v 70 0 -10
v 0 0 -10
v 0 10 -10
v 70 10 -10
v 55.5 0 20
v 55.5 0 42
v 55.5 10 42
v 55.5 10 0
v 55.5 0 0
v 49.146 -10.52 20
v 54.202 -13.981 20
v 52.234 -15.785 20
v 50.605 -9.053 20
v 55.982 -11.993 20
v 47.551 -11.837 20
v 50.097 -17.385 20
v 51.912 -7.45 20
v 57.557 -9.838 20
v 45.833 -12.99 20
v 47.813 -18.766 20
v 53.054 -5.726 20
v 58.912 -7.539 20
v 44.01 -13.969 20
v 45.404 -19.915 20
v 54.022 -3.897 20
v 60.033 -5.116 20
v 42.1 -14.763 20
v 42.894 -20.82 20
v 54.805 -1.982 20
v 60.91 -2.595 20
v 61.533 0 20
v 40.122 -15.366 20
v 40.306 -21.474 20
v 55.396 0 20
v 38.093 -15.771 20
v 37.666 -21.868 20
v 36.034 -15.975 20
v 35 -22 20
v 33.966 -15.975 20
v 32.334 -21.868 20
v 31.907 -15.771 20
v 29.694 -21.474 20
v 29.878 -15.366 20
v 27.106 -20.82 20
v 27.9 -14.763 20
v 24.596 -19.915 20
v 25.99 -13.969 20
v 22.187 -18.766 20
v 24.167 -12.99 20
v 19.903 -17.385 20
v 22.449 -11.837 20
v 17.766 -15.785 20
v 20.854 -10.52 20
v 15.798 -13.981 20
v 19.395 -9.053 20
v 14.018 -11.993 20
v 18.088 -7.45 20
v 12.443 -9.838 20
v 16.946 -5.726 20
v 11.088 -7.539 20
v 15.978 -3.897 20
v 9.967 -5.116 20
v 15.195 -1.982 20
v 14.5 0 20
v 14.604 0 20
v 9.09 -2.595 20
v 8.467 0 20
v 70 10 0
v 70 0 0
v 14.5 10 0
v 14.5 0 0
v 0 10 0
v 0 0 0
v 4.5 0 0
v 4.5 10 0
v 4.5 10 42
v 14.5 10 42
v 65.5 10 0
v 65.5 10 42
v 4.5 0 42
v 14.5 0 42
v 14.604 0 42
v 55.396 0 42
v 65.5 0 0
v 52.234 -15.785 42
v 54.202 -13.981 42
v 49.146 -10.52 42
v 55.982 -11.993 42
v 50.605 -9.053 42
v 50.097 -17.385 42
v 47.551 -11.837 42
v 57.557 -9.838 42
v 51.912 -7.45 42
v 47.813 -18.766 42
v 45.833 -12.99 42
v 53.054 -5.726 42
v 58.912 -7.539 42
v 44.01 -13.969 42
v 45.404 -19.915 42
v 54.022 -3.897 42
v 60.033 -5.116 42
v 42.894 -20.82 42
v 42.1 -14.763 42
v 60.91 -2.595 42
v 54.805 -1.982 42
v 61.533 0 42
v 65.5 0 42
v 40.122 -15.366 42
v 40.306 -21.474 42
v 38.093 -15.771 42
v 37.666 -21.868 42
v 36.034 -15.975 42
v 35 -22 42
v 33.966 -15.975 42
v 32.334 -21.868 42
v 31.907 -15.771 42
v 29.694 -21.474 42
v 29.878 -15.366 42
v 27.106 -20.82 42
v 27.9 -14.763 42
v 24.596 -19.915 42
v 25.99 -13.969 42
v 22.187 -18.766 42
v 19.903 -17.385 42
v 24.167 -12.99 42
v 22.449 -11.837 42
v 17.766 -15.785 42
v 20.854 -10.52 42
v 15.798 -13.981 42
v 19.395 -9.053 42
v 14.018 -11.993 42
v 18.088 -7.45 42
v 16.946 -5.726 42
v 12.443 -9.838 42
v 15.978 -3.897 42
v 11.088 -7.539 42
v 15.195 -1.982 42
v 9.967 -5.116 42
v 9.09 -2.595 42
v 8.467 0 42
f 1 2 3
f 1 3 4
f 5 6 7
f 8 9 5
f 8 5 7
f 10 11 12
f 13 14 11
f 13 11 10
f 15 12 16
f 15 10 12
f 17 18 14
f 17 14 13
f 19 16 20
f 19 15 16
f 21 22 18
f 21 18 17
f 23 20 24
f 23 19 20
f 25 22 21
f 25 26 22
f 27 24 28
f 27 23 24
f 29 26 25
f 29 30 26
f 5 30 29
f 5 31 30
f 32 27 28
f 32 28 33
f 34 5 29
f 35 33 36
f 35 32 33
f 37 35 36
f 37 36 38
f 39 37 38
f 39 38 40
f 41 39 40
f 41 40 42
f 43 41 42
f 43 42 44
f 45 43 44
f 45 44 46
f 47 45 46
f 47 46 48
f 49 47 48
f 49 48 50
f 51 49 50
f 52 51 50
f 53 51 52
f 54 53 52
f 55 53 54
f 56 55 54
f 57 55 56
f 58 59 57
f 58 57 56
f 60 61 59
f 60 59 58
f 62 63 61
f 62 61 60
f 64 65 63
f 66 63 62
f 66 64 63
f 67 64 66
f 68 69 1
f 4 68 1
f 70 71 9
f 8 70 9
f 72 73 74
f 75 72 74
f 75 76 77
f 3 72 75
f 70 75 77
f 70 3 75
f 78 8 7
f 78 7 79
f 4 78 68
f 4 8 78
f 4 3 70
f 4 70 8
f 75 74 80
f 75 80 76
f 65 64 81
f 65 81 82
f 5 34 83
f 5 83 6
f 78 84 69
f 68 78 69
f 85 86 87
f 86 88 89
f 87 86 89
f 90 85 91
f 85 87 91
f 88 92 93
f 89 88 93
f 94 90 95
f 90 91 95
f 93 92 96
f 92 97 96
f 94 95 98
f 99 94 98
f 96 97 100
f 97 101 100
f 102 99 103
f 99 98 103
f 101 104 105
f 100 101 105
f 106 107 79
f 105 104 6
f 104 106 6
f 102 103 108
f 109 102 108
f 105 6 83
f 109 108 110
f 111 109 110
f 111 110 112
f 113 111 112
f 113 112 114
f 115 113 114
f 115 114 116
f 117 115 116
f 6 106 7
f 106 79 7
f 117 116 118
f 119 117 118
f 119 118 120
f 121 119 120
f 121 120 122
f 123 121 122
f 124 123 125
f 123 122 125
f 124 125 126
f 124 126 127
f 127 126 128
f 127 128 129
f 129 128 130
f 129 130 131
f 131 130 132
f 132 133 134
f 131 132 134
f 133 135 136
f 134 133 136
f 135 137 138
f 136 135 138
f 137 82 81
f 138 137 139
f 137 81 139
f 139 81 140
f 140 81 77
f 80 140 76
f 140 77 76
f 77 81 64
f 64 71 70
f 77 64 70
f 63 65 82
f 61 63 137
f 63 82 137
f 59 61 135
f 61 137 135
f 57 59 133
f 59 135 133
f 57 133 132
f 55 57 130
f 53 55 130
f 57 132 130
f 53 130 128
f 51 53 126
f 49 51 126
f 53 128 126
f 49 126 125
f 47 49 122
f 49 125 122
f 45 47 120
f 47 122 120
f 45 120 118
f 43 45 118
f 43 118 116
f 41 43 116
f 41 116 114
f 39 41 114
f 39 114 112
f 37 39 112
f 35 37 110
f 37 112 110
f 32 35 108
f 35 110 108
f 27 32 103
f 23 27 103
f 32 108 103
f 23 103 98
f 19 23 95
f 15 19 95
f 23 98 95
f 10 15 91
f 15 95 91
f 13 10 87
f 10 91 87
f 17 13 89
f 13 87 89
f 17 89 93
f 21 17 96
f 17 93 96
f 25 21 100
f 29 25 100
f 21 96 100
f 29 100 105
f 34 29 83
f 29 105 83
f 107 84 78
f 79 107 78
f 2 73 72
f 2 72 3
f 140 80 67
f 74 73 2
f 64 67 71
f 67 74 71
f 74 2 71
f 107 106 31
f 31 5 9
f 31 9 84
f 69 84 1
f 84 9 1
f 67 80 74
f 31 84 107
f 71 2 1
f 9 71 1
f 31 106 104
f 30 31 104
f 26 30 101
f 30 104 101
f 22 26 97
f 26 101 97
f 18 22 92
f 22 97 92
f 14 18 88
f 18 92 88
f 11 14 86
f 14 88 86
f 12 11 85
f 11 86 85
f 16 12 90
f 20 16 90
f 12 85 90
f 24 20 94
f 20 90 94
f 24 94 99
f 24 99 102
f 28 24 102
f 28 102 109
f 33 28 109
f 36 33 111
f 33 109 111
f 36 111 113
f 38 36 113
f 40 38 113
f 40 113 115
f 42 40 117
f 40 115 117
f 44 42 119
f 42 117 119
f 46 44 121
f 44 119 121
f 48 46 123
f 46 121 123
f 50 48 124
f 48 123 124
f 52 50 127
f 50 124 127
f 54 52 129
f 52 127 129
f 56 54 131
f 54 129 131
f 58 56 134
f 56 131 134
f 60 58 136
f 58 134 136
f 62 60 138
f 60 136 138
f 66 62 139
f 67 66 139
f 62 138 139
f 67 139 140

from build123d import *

# Parameters (mm, degrees)
SKETCH_1_W      = 70
SKETCH_1_H      = 10
EXTRUDE_1_DEPTH = 10
SKETCH_2_W      = 10
SKETCH_2_H      = 10
EXTRUDE_2_DEPTH = 42
EXTRUDE_3_DEPTH = 22


with BuildPart() as part:
    # 草图1 → 凸台-拉伸1 (new body)
    with BuildSketch(Plane(origin=(0, 0, 0), x_dir=(1, 0, 0), z_dir=(0, 1, 0))):
        with Locations((35, 5)):
            Rectangle(SKETCH_1_W, SKETCH_1_H)
    extrude(amount=EXTRUDE_1_DEPTH)

    # 草图2 → 凸台-拉伸2 (add)
    with BuildSketch(Plane.XY):
        with Locations((9.5, 5)):
            Rectangle(SKETCH_2_W, SKETCH_2_H)
        with Locations((60.5, 5)):
            Rectangle(SKETCH_2_W, SKETCH_2_H)
    extrude(amount=EXTRUDE_2_DEPTH)

    # 草图3 → 凸台-拉伸3 (add)
    with BuildSketch(Plane.XY.offset(42)):
        with BuildLine():
            Line((8.467001677, 0), (14.603921946, 0))
            ThreePointArc((14.603921946, 0), (35, -16), (55.396078054, 0))
            Line((55.396078054, 0), (61.532998323, 0))
            ThreePointArc((61.532998323, 0), (35, -22), (8.467001677, 0))
        make_face()
    extrude(amount=-EXTRUDE_3_DEPTH)


solid = part.part
